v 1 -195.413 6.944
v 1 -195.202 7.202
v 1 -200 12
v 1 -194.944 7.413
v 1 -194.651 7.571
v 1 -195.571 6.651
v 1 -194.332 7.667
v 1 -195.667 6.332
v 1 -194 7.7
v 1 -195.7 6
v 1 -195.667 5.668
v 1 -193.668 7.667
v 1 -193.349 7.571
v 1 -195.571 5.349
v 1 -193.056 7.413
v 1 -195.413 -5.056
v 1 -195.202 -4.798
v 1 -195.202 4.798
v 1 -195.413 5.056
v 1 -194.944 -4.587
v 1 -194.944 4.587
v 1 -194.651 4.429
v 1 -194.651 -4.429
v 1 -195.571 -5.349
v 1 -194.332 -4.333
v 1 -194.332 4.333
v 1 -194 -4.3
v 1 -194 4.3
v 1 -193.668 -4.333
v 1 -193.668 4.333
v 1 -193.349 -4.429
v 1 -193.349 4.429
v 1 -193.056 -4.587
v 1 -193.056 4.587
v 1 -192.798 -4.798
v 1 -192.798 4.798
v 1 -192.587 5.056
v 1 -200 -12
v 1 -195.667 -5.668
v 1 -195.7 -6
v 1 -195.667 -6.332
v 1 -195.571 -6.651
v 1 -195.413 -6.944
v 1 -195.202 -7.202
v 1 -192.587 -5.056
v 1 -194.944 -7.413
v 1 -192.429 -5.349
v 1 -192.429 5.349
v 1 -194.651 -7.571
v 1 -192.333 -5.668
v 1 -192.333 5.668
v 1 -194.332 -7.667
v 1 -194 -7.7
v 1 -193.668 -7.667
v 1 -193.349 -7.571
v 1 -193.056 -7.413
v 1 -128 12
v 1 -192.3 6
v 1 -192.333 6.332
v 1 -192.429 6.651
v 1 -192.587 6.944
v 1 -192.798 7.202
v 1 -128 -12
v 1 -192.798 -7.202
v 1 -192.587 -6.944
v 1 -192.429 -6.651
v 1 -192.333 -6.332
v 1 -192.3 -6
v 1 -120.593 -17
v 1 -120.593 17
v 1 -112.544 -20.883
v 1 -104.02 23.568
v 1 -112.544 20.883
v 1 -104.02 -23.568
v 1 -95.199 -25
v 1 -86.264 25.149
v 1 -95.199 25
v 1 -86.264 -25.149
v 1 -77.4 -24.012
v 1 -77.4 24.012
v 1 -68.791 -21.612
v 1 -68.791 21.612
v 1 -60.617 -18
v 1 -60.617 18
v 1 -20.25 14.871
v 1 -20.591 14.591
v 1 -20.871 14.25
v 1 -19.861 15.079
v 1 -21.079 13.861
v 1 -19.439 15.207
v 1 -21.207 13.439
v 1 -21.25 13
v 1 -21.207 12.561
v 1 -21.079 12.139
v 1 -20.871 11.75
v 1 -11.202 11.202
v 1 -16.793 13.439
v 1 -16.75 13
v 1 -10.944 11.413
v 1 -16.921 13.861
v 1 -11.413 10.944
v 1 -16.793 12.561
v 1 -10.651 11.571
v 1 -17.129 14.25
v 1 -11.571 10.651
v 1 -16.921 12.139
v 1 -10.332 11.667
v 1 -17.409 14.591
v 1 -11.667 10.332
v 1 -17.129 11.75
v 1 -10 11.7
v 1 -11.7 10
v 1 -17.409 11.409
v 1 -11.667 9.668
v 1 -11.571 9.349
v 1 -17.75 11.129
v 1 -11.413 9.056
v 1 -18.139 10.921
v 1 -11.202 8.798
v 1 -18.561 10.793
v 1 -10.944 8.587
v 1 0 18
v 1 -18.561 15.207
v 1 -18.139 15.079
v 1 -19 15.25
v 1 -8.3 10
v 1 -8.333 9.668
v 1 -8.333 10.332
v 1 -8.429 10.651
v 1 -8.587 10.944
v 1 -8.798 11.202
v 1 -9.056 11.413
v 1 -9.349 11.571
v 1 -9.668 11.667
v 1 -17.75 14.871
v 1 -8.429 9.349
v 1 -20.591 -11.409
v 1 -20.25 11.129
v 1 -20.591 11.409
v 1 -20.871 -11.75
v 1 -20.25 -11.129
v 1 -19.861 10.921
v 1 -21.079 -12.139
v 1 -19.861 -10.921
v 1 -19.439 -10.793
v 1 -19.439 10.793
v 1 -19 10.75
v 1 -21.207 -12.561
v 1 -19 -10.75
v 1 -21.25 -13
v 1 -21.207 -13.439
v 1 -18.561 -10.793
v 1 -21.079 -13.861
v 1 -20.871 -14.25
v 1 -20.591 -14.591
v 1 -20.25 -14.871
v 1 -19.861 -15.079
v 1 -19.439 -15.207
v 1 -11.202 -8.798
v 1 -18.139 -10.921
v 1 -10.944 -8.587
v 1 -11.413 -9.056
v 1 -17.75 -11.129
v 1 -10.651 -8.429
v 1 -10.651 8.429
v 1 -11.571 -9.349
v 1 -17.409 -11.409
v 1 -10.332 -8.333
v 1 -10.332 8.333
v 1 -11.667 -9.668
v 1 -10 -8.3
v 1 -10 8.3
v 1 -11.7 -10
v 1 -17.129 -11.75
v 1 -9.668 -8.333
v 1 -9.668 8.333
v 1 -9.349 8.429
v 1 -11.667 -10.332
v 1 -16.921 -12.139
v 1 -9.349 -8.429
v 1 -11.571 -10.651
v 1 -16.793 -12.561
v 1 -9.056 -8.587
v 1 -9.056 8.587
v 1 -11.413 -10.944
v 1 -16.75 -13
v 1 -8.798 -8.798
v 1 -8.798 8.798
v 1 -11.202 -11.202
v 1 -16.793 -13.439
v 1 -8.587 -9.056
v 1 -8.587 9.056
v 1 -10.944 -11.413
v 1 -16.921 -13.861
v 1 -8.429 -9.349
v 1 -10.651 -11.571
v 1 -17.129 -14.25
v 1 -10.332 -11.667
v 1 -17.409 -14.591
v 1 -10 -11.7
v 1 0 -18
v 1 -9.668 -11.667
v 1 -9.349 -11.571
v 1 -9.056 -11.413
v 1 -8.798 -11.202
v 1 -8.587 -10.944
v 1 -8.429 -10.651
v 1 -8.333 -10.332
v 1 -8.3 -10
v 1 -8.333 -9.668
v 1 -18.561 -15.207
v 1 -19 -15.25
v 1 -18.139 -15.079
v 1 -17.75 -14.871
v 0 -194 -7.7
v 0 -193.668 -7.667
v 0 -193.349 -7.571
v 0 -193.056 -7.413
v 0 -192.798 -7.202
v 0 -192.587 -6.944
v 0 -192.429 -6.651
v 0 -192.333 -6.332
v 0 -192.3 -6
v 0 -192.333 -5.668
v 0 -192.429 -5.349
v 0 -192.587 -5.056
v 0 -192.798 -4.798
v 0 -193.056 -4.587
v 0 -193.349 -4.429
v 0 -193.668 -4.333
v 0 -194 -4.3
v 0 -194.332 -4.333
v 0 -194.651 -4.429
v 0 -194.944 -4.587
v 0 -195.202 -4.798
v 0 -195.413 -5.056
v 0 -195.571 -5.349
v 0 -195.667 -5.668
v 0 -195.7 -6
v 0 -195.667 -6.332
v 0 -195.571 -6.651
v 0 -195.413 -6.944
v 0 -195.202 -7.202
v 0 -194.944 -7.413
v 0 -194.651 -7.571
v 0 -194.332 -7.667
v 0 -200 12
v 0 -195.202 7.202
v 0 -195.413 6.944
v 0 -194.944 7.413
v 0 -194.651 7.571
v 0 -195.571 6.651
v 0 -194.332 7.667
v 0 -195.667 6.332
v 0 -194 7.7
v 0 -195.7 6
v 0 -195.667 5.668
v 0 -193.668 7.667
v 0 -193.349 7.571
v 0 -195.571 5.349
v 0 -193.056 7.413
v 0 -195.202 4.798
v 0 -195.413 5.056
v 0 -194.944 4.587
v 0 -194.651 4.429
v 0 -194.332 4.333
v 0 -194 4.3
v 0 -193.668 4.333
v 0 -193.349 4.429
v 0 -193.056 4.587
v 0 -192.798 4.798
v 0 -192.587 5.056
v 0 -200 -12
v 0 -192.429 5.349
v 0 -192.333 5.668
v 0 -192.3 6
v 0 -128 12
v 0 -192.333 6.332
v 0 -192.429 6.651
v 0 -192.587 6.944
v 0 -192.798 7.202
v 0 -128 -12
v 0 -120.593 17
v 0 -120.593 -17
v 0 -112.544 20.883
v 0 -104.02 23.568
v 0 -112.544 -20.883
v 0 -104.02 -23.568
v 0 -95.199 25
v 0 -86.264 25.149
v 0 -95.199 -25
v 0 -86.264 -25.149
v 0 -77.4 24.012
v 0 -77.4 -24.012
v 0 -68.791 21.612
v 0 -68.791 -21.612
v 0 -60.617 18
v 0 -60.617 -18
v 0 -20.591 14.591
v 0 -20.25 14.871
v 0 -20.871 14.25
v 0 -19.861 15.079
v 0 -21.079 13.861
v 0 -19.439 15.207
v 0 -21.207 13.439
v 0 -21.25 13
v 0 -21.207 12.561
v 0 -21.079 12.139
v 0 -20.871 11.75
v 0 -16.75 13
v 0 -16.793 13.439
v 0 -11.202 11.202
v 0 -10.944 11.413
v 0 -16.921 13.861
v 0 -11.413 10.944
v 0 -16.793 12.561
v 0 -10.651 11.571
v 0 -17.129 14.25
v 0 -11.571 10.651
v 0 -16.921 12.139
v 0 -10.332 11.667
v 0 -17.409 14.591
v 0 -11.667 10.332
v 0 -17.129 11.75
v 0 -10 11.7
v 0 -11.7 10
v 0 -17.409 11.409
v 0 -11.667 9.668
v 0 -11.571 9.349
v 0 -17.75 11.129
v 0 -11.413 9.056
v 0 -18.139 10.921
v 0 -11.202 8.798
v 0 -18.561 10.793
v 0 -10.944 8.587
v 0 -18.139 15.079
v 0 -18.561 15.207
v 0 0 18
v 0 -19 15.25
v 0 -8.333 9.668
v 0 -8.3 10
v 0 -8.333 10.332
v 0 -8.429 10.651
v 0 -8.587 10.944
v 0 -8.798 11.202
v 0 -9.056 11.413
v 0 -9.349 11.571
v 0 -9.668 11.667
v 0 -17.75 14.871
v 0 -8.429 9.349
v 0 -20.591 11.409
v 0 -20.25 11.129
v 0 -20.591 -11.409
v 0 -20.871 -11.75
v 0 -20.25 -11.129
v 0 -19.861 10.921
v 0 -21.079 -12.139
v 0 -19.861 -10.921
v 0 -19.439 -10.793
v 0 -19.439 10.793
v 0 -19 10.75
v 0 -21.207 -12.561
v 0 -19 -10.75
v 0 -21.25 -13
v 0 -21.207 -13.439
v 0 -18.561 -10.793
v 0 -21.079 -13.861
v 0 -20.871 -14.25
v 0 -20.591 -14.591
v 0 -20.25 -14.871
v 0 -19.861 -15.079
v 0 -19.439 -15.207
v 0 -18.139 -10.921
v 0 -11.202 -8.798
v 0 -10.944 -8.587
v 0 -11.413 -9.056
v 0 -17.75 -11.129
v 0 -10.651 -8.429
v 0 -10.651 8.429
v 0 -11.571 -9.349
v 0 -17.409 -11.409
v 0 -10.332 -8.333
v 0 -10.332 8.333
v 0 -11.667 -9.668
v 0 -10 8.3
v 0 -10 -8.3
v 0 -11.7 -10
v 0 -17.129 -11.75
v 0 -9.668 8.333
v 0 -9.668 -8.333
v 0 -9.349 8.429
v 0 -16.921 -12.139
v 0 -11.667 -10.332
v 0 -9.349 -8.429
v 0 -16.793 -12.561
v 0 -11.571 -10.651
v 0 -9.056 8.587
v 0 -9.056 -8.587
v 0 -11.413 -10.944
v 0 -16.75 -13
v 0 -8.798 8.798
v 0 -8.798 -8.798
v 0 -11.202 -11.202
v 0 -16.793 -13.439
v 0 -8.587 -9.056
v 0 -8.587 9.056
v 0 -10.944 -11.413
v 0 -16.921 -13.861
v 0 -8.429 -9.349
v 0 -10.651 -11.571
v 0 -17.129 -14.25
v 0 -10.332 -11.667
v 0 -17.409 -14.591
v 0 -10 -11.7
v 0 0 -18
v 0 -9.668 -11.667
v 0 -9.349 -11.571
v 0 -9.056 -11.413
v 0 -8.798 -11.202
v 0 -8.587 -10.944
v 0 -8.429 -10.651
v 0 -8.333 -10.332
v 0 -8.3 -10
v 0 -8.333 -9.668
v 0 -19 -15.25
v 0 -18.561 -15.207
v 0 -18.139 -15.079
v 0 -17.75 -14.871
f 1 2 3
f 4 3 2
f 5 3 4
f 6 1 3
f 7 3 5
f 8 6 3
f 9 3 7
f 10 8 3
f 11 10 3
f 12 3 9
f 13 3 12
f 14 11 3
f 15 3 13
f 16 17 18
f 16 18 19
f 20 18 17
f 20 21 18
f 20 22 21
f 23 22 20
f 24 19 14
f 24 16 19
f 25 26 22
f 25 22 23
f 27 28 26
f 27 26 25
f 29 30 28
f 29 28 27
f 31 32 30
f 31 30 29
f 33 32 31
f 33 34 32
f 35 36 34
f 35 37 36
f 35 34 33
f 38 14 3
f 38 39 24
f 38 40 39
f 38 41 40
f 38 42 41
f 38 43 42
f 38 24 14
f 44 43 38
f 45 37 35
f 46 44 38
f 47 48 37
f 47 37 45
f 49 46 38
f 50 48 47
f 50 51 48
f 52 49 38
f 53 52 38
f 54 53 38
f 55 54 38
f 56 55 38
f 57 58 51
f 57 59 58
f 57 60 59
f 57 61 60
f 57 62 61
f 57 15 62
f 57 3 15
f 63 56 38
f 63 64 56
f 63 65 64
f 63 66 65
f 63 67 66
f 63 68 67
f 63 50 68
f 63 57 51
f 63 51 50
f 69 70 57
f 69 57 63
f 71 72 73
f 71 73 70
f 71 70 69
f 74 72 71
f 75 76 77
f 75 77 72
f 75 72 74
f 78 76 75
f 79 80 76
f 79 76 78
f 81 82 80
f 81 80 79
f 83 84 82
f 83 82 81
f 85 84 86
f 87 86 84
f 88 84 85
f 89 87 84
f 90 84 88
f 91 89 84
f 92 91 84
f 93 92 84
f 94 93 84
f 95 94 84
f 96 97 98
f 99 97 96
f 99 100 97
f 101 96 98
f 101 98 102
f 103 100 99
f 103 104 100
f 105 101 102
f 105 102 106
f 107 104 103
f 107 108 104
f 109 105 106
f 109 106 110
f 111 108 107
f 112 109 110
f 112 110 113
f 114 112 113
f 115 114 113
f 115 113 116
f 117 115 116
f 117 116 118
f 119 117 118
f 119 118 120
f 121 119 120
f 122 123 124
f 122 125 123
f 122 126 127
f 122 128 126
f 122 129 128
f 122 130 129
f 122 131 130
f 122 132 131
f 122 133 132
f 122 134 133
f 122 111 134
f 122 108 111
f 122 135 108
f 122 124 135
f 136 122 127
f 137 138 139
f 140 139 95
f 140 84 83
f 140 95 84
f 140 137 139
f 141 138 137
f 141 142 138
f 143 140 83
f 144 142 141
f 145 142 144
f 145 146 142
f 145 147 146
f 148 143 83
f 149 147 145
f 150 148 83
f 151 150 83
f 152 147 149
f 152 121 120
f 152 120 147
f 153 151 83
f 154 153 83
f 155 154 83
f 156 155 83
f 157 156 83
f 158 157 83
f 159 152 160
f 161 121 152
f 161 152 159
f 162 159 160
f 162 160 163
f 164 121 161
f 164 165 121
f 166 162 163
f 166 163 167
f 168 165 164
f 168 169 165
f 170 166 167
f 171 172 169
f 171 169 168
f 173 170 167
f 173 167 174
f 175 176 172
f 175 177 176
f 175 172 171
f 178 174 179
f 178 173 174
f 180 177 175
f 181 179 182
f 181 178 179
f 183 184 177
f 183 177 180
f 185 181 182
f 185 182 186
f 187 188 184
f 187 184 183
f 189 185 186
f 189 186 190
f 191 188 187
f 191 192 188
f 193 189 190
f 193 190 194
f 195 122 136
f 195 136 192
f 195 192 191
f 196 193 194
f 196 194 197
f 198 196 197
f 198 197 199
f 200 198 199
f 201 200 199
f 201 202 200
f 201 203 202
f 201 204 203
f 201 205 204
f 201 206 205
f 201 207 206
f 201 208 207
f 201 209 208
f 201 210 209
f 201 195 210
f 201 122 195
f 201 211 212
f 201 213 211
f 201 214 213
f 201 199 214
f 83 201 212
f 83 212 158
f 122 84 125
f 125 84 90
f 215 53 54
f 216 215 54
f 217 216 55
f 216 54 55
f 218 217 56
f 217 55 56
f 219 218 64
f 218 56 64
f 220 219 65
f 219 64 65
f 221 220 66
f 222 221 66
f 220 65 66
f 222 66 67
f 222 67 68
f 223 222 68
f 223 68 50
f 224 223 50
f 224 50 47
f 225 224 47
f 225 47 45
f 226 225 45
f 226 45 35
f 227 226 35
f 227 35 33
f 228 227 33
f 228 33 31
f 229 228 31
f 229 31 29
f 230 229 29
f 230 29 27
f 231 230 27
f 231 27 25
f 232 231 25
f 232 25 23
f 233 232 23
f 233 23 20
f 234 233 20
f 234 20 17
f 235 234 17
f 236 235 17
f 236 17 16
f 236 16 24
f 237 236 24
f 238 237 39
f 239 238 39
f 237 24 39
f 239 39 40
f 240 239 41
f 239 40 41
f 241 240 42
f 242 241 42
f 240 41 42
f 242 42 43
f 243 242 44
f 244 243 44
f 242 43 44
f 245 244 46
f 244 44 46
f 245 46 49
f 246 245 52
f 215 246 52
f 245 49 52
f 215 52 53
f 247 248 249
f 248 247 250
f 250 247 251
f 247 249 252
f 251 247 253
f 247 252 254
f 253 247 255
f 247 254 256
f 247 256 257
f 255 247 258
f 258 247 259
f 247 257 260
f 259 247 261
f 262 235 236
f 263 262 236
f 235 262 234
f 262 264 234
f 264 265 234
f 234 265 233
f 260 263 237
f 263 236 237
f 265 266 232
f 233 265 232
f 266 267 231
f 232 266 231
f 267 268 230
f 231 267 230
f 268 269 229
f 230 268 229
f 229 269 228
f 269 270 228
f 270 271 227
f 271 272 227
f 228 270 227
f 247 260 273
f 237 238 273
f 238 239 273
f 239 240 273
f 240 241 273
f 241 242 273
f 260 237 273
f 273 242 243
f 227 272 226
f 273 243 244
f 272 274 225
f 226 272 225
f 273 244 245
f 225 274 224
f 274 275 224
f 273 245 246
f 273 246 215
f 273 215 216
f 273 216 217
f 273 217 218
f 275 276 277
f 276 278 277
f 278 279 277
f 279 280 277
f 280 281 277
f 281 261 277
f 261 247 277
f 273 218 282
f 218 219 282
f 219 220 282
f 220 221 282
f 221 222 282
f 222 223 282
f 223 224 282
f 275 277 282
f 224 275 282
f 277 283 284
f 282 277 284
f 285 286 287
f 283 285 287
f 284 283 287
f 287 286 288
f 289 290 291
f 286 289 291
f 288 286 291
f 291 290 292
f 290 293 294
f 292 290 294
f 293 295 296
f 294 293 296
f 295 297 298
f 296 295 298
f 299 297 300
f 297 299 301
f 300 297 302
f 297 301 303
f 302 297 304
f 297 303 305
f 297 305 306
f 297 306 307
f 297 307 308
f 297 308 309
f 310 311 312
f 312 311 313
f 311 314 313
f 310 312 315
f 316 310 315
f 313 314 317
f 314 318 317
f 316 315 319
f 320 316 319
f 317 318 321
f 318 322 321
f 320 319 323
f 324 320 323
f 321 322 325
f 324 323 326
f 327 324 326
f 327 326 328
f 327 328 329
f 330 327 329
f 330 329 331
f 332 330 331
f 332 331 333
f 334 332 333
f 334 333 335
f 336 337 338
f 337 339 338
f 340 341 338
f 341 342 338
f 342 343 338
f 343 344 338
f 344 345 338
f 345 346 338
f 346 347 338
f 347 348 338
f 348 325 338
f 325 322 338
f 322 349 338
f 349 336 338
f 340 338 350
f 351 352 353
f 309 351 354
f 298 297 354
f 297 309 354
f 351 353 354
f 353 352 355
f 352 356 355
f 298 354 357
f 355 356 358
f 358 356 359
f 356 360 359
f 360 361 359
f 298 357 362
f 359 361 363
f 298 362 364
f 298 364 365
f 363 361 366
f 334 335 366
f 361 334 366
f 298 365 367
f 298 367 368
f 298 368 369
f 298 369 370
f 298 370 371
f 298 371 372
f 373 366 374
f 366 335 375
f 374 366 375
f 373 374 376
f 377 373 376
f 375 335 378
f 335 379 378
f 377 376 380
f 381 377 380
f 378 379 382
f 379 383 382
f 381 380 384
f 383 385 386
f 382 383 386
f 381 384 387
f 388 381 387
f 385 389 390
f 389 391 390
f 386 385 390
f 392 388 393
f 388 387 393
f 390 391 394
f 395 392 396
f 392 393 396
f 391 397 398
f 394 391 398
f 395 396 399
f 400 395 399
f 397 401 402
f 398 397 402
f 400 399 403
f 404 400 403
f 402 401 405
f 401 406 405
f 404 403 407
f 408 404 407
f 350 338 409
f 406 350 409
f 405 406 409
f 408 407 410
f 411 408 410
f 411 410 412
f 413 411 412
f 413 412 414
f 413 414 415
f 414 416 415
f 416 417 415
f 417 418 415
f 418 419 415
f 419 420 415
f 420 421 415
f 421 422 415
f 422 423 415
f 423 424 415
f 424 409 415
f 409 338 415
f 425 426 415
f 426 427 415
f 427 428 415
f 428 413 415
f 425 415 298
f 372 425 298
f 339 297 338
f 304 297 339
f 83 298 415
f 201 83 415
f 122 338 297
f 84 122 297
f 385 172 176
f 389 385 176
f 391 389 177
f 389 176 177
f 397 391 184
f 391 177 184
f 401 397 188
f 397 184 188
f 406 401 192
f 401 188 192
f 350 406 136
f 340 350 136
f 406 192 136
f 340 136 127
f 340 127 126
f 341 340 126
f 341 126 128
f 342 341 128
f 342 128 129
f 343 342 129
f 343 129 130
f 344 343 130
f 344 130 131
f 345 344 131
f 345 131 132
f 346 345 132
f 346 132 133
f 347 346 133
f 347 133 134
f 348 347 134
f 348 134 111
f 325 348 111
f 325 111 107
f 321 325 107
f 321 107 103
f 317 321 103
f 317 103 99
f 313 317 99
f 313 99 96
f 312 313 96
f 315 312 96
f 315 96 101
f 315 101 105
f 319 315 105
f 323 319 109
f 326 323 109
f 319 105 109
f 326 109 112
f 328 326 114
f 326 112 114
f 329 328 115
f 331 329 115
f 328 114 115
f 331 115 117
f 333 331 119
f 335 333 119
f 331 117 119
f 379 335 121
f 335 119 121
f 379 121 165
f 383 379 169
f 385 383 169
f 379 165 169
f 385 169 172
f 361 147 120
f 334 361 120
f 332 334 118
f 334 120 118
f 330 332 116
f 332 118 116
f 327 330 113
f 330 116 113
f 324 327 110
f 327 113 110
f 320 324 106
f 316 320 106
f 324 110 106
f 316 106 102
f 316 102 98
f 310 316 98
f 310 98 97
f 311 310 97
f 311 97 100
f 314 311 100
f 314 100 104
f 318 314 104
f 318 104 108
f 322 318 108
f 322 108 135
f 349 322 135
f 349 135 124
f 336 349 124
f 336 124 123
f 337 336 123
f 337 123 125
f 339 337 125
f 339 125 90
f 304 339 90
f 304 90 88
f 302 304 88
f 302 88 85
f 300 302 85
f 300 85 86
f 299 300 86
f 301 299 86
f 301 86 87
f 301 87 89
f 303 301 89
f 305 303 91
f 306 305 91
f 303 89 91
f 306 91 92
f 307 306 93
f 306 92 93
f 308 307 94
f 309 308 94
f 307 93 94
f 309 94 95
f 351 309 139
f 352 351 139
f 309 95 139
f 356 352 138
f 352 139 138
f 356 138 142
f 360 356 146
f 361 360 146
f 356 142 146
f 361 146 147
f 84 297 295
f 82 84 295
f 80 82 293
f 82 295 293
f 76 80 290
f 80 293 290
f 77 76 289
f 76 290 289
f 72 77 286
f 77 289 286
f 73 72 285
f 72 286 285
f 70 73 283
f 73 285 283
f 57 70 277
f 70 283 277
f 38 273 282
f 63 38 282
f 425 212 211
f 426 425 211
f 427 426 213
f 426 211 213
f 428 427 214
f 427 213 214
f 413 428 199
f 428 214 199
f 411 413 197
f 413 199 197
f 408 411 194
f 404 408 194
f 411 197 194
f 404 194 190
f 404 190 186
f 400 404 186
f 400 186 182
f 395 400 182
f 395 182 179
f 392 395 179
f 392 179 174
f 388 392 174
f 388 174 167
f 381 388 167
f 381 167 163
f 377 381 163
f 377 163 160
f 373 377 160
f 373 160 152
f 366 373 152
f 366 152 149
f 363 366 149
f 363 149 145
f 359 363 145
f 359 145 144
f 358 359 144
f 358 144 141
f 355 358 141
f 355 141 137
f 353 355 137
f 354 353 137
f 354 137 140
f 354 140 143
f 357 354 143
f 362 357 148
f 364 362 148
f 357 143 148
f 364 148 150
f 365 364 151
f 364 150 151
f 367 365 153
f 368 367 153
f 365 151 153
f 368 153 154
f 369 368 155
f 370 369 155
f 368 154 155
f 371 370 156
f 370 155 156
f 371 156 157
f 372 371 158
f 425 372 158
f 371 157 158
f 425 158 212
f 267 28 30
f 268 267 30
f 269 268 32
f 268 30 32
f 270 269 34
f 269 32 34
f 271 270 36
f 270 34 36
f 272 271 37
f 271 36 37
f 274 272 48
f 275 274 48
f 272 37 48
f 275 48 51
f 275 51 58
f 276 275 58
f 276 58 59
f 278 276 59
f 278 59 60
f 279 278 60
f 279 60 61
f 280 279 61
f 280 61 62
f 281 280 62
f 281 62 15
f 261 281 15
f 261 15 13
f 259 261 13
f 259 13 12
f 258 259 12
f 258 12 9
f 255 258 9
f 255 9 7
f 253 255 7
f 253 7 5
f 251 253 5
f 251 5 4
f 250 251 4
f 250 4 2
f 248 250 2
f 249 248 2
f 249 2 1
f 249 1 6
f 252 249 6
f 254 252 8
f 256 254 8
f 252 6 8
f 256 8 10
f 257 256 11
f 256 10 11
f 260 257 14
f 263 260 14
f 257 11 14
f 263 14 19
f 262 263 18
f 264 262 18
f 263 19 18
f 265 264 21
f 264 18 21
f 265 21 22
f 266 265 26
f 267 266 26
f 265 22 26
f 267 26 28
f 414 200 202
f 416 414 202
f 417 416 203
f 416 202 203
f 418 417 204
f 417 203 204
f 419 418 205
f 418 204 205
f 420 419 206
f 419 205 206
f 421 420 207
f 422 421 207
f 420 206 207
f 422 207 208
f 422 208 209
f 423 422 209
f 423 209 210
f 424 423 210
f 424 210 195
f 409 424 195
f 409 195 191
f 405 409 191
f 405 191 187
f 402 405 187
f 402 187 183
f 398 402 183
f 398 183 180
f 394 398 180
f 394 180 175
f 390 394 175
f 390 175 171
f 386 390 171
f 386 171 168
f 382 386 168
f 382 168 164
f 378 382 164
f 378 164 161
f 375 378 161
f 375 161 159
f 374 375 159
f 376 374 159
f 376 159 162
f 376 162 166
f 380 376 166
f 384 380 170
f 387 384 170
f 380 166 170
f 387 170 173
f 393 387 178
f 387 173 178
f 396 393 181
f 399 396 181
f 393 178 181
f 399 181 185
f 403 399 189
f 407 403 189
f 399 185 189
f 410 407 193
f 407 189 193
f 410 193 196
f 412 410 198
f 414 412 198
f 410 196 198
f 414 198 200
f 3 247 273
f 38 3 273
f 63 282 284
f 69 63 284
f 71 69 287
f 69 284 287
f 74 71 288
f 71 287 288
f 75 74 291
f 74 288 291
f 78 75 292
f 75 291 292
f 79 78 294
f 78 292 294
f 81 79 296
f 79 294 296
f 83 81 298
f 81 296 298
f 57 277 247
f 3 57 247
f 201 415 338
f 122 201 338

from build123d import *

# Parameters (mm, degrees)
BOSS_EXTRUDE1_DEPTH  = 1
M4_CLEARANCE_HOLE1_D = 4.5
M3_CLEARANCE_HOLE1_D = 3.4
M3_CLEARANCE_HOLE2_D = 3.4


with BuildPart() as part:
    # Sketch1 → Boss-Extrude1 (new body)
    with BuildSketch(Plane(origin=(0, 0, 0), x_dir=(0, 0, -1), z_dir=(1, 0, 0))):
        with BuildLine():
            Line((12, -200), (12, -128))
            ThreePointArc((12, -128), (25, -95.198992339), (18, -60.617116977))
            Line((18, -60.617116977), (18, 0))
            Line((18, 0), (-18, 0))
            Line((-18, 0), (-18, -60.617116977))
            ThreePointArc((-18, -60.617116977), (-25, -95.198992339), (-12, -128))
            Line((-12, -128), (-12, -200))
            Line((-12, -200), (12, -200))
        make_face()
    extrude(amount=BOSS_EXTRUDE1_DEPTH)

    # M4 Clearance Hole1 (through all)
    with Locations(Plane.ZY):
        with Locations((13, -19), (-13, -19)):
            Hole(M4_CLEARANCE_HOLE1_D / 2)

    # M3 Clearance Hole1 (through all)
    with Locations(Plane.ZY):
        with Locations((-10, -10), (10, -10)):
            Hole(M3_CLEARANCE_HOLE1_D / 2)

    # M3 Clearance Hole2 (through all)
    with Locations(Plane.ZY):
        with Locations((6, -194), (-6, -194)):
            Hole(M3_CLEARANCE_HOLE2_D / 2)


solid = part.part
